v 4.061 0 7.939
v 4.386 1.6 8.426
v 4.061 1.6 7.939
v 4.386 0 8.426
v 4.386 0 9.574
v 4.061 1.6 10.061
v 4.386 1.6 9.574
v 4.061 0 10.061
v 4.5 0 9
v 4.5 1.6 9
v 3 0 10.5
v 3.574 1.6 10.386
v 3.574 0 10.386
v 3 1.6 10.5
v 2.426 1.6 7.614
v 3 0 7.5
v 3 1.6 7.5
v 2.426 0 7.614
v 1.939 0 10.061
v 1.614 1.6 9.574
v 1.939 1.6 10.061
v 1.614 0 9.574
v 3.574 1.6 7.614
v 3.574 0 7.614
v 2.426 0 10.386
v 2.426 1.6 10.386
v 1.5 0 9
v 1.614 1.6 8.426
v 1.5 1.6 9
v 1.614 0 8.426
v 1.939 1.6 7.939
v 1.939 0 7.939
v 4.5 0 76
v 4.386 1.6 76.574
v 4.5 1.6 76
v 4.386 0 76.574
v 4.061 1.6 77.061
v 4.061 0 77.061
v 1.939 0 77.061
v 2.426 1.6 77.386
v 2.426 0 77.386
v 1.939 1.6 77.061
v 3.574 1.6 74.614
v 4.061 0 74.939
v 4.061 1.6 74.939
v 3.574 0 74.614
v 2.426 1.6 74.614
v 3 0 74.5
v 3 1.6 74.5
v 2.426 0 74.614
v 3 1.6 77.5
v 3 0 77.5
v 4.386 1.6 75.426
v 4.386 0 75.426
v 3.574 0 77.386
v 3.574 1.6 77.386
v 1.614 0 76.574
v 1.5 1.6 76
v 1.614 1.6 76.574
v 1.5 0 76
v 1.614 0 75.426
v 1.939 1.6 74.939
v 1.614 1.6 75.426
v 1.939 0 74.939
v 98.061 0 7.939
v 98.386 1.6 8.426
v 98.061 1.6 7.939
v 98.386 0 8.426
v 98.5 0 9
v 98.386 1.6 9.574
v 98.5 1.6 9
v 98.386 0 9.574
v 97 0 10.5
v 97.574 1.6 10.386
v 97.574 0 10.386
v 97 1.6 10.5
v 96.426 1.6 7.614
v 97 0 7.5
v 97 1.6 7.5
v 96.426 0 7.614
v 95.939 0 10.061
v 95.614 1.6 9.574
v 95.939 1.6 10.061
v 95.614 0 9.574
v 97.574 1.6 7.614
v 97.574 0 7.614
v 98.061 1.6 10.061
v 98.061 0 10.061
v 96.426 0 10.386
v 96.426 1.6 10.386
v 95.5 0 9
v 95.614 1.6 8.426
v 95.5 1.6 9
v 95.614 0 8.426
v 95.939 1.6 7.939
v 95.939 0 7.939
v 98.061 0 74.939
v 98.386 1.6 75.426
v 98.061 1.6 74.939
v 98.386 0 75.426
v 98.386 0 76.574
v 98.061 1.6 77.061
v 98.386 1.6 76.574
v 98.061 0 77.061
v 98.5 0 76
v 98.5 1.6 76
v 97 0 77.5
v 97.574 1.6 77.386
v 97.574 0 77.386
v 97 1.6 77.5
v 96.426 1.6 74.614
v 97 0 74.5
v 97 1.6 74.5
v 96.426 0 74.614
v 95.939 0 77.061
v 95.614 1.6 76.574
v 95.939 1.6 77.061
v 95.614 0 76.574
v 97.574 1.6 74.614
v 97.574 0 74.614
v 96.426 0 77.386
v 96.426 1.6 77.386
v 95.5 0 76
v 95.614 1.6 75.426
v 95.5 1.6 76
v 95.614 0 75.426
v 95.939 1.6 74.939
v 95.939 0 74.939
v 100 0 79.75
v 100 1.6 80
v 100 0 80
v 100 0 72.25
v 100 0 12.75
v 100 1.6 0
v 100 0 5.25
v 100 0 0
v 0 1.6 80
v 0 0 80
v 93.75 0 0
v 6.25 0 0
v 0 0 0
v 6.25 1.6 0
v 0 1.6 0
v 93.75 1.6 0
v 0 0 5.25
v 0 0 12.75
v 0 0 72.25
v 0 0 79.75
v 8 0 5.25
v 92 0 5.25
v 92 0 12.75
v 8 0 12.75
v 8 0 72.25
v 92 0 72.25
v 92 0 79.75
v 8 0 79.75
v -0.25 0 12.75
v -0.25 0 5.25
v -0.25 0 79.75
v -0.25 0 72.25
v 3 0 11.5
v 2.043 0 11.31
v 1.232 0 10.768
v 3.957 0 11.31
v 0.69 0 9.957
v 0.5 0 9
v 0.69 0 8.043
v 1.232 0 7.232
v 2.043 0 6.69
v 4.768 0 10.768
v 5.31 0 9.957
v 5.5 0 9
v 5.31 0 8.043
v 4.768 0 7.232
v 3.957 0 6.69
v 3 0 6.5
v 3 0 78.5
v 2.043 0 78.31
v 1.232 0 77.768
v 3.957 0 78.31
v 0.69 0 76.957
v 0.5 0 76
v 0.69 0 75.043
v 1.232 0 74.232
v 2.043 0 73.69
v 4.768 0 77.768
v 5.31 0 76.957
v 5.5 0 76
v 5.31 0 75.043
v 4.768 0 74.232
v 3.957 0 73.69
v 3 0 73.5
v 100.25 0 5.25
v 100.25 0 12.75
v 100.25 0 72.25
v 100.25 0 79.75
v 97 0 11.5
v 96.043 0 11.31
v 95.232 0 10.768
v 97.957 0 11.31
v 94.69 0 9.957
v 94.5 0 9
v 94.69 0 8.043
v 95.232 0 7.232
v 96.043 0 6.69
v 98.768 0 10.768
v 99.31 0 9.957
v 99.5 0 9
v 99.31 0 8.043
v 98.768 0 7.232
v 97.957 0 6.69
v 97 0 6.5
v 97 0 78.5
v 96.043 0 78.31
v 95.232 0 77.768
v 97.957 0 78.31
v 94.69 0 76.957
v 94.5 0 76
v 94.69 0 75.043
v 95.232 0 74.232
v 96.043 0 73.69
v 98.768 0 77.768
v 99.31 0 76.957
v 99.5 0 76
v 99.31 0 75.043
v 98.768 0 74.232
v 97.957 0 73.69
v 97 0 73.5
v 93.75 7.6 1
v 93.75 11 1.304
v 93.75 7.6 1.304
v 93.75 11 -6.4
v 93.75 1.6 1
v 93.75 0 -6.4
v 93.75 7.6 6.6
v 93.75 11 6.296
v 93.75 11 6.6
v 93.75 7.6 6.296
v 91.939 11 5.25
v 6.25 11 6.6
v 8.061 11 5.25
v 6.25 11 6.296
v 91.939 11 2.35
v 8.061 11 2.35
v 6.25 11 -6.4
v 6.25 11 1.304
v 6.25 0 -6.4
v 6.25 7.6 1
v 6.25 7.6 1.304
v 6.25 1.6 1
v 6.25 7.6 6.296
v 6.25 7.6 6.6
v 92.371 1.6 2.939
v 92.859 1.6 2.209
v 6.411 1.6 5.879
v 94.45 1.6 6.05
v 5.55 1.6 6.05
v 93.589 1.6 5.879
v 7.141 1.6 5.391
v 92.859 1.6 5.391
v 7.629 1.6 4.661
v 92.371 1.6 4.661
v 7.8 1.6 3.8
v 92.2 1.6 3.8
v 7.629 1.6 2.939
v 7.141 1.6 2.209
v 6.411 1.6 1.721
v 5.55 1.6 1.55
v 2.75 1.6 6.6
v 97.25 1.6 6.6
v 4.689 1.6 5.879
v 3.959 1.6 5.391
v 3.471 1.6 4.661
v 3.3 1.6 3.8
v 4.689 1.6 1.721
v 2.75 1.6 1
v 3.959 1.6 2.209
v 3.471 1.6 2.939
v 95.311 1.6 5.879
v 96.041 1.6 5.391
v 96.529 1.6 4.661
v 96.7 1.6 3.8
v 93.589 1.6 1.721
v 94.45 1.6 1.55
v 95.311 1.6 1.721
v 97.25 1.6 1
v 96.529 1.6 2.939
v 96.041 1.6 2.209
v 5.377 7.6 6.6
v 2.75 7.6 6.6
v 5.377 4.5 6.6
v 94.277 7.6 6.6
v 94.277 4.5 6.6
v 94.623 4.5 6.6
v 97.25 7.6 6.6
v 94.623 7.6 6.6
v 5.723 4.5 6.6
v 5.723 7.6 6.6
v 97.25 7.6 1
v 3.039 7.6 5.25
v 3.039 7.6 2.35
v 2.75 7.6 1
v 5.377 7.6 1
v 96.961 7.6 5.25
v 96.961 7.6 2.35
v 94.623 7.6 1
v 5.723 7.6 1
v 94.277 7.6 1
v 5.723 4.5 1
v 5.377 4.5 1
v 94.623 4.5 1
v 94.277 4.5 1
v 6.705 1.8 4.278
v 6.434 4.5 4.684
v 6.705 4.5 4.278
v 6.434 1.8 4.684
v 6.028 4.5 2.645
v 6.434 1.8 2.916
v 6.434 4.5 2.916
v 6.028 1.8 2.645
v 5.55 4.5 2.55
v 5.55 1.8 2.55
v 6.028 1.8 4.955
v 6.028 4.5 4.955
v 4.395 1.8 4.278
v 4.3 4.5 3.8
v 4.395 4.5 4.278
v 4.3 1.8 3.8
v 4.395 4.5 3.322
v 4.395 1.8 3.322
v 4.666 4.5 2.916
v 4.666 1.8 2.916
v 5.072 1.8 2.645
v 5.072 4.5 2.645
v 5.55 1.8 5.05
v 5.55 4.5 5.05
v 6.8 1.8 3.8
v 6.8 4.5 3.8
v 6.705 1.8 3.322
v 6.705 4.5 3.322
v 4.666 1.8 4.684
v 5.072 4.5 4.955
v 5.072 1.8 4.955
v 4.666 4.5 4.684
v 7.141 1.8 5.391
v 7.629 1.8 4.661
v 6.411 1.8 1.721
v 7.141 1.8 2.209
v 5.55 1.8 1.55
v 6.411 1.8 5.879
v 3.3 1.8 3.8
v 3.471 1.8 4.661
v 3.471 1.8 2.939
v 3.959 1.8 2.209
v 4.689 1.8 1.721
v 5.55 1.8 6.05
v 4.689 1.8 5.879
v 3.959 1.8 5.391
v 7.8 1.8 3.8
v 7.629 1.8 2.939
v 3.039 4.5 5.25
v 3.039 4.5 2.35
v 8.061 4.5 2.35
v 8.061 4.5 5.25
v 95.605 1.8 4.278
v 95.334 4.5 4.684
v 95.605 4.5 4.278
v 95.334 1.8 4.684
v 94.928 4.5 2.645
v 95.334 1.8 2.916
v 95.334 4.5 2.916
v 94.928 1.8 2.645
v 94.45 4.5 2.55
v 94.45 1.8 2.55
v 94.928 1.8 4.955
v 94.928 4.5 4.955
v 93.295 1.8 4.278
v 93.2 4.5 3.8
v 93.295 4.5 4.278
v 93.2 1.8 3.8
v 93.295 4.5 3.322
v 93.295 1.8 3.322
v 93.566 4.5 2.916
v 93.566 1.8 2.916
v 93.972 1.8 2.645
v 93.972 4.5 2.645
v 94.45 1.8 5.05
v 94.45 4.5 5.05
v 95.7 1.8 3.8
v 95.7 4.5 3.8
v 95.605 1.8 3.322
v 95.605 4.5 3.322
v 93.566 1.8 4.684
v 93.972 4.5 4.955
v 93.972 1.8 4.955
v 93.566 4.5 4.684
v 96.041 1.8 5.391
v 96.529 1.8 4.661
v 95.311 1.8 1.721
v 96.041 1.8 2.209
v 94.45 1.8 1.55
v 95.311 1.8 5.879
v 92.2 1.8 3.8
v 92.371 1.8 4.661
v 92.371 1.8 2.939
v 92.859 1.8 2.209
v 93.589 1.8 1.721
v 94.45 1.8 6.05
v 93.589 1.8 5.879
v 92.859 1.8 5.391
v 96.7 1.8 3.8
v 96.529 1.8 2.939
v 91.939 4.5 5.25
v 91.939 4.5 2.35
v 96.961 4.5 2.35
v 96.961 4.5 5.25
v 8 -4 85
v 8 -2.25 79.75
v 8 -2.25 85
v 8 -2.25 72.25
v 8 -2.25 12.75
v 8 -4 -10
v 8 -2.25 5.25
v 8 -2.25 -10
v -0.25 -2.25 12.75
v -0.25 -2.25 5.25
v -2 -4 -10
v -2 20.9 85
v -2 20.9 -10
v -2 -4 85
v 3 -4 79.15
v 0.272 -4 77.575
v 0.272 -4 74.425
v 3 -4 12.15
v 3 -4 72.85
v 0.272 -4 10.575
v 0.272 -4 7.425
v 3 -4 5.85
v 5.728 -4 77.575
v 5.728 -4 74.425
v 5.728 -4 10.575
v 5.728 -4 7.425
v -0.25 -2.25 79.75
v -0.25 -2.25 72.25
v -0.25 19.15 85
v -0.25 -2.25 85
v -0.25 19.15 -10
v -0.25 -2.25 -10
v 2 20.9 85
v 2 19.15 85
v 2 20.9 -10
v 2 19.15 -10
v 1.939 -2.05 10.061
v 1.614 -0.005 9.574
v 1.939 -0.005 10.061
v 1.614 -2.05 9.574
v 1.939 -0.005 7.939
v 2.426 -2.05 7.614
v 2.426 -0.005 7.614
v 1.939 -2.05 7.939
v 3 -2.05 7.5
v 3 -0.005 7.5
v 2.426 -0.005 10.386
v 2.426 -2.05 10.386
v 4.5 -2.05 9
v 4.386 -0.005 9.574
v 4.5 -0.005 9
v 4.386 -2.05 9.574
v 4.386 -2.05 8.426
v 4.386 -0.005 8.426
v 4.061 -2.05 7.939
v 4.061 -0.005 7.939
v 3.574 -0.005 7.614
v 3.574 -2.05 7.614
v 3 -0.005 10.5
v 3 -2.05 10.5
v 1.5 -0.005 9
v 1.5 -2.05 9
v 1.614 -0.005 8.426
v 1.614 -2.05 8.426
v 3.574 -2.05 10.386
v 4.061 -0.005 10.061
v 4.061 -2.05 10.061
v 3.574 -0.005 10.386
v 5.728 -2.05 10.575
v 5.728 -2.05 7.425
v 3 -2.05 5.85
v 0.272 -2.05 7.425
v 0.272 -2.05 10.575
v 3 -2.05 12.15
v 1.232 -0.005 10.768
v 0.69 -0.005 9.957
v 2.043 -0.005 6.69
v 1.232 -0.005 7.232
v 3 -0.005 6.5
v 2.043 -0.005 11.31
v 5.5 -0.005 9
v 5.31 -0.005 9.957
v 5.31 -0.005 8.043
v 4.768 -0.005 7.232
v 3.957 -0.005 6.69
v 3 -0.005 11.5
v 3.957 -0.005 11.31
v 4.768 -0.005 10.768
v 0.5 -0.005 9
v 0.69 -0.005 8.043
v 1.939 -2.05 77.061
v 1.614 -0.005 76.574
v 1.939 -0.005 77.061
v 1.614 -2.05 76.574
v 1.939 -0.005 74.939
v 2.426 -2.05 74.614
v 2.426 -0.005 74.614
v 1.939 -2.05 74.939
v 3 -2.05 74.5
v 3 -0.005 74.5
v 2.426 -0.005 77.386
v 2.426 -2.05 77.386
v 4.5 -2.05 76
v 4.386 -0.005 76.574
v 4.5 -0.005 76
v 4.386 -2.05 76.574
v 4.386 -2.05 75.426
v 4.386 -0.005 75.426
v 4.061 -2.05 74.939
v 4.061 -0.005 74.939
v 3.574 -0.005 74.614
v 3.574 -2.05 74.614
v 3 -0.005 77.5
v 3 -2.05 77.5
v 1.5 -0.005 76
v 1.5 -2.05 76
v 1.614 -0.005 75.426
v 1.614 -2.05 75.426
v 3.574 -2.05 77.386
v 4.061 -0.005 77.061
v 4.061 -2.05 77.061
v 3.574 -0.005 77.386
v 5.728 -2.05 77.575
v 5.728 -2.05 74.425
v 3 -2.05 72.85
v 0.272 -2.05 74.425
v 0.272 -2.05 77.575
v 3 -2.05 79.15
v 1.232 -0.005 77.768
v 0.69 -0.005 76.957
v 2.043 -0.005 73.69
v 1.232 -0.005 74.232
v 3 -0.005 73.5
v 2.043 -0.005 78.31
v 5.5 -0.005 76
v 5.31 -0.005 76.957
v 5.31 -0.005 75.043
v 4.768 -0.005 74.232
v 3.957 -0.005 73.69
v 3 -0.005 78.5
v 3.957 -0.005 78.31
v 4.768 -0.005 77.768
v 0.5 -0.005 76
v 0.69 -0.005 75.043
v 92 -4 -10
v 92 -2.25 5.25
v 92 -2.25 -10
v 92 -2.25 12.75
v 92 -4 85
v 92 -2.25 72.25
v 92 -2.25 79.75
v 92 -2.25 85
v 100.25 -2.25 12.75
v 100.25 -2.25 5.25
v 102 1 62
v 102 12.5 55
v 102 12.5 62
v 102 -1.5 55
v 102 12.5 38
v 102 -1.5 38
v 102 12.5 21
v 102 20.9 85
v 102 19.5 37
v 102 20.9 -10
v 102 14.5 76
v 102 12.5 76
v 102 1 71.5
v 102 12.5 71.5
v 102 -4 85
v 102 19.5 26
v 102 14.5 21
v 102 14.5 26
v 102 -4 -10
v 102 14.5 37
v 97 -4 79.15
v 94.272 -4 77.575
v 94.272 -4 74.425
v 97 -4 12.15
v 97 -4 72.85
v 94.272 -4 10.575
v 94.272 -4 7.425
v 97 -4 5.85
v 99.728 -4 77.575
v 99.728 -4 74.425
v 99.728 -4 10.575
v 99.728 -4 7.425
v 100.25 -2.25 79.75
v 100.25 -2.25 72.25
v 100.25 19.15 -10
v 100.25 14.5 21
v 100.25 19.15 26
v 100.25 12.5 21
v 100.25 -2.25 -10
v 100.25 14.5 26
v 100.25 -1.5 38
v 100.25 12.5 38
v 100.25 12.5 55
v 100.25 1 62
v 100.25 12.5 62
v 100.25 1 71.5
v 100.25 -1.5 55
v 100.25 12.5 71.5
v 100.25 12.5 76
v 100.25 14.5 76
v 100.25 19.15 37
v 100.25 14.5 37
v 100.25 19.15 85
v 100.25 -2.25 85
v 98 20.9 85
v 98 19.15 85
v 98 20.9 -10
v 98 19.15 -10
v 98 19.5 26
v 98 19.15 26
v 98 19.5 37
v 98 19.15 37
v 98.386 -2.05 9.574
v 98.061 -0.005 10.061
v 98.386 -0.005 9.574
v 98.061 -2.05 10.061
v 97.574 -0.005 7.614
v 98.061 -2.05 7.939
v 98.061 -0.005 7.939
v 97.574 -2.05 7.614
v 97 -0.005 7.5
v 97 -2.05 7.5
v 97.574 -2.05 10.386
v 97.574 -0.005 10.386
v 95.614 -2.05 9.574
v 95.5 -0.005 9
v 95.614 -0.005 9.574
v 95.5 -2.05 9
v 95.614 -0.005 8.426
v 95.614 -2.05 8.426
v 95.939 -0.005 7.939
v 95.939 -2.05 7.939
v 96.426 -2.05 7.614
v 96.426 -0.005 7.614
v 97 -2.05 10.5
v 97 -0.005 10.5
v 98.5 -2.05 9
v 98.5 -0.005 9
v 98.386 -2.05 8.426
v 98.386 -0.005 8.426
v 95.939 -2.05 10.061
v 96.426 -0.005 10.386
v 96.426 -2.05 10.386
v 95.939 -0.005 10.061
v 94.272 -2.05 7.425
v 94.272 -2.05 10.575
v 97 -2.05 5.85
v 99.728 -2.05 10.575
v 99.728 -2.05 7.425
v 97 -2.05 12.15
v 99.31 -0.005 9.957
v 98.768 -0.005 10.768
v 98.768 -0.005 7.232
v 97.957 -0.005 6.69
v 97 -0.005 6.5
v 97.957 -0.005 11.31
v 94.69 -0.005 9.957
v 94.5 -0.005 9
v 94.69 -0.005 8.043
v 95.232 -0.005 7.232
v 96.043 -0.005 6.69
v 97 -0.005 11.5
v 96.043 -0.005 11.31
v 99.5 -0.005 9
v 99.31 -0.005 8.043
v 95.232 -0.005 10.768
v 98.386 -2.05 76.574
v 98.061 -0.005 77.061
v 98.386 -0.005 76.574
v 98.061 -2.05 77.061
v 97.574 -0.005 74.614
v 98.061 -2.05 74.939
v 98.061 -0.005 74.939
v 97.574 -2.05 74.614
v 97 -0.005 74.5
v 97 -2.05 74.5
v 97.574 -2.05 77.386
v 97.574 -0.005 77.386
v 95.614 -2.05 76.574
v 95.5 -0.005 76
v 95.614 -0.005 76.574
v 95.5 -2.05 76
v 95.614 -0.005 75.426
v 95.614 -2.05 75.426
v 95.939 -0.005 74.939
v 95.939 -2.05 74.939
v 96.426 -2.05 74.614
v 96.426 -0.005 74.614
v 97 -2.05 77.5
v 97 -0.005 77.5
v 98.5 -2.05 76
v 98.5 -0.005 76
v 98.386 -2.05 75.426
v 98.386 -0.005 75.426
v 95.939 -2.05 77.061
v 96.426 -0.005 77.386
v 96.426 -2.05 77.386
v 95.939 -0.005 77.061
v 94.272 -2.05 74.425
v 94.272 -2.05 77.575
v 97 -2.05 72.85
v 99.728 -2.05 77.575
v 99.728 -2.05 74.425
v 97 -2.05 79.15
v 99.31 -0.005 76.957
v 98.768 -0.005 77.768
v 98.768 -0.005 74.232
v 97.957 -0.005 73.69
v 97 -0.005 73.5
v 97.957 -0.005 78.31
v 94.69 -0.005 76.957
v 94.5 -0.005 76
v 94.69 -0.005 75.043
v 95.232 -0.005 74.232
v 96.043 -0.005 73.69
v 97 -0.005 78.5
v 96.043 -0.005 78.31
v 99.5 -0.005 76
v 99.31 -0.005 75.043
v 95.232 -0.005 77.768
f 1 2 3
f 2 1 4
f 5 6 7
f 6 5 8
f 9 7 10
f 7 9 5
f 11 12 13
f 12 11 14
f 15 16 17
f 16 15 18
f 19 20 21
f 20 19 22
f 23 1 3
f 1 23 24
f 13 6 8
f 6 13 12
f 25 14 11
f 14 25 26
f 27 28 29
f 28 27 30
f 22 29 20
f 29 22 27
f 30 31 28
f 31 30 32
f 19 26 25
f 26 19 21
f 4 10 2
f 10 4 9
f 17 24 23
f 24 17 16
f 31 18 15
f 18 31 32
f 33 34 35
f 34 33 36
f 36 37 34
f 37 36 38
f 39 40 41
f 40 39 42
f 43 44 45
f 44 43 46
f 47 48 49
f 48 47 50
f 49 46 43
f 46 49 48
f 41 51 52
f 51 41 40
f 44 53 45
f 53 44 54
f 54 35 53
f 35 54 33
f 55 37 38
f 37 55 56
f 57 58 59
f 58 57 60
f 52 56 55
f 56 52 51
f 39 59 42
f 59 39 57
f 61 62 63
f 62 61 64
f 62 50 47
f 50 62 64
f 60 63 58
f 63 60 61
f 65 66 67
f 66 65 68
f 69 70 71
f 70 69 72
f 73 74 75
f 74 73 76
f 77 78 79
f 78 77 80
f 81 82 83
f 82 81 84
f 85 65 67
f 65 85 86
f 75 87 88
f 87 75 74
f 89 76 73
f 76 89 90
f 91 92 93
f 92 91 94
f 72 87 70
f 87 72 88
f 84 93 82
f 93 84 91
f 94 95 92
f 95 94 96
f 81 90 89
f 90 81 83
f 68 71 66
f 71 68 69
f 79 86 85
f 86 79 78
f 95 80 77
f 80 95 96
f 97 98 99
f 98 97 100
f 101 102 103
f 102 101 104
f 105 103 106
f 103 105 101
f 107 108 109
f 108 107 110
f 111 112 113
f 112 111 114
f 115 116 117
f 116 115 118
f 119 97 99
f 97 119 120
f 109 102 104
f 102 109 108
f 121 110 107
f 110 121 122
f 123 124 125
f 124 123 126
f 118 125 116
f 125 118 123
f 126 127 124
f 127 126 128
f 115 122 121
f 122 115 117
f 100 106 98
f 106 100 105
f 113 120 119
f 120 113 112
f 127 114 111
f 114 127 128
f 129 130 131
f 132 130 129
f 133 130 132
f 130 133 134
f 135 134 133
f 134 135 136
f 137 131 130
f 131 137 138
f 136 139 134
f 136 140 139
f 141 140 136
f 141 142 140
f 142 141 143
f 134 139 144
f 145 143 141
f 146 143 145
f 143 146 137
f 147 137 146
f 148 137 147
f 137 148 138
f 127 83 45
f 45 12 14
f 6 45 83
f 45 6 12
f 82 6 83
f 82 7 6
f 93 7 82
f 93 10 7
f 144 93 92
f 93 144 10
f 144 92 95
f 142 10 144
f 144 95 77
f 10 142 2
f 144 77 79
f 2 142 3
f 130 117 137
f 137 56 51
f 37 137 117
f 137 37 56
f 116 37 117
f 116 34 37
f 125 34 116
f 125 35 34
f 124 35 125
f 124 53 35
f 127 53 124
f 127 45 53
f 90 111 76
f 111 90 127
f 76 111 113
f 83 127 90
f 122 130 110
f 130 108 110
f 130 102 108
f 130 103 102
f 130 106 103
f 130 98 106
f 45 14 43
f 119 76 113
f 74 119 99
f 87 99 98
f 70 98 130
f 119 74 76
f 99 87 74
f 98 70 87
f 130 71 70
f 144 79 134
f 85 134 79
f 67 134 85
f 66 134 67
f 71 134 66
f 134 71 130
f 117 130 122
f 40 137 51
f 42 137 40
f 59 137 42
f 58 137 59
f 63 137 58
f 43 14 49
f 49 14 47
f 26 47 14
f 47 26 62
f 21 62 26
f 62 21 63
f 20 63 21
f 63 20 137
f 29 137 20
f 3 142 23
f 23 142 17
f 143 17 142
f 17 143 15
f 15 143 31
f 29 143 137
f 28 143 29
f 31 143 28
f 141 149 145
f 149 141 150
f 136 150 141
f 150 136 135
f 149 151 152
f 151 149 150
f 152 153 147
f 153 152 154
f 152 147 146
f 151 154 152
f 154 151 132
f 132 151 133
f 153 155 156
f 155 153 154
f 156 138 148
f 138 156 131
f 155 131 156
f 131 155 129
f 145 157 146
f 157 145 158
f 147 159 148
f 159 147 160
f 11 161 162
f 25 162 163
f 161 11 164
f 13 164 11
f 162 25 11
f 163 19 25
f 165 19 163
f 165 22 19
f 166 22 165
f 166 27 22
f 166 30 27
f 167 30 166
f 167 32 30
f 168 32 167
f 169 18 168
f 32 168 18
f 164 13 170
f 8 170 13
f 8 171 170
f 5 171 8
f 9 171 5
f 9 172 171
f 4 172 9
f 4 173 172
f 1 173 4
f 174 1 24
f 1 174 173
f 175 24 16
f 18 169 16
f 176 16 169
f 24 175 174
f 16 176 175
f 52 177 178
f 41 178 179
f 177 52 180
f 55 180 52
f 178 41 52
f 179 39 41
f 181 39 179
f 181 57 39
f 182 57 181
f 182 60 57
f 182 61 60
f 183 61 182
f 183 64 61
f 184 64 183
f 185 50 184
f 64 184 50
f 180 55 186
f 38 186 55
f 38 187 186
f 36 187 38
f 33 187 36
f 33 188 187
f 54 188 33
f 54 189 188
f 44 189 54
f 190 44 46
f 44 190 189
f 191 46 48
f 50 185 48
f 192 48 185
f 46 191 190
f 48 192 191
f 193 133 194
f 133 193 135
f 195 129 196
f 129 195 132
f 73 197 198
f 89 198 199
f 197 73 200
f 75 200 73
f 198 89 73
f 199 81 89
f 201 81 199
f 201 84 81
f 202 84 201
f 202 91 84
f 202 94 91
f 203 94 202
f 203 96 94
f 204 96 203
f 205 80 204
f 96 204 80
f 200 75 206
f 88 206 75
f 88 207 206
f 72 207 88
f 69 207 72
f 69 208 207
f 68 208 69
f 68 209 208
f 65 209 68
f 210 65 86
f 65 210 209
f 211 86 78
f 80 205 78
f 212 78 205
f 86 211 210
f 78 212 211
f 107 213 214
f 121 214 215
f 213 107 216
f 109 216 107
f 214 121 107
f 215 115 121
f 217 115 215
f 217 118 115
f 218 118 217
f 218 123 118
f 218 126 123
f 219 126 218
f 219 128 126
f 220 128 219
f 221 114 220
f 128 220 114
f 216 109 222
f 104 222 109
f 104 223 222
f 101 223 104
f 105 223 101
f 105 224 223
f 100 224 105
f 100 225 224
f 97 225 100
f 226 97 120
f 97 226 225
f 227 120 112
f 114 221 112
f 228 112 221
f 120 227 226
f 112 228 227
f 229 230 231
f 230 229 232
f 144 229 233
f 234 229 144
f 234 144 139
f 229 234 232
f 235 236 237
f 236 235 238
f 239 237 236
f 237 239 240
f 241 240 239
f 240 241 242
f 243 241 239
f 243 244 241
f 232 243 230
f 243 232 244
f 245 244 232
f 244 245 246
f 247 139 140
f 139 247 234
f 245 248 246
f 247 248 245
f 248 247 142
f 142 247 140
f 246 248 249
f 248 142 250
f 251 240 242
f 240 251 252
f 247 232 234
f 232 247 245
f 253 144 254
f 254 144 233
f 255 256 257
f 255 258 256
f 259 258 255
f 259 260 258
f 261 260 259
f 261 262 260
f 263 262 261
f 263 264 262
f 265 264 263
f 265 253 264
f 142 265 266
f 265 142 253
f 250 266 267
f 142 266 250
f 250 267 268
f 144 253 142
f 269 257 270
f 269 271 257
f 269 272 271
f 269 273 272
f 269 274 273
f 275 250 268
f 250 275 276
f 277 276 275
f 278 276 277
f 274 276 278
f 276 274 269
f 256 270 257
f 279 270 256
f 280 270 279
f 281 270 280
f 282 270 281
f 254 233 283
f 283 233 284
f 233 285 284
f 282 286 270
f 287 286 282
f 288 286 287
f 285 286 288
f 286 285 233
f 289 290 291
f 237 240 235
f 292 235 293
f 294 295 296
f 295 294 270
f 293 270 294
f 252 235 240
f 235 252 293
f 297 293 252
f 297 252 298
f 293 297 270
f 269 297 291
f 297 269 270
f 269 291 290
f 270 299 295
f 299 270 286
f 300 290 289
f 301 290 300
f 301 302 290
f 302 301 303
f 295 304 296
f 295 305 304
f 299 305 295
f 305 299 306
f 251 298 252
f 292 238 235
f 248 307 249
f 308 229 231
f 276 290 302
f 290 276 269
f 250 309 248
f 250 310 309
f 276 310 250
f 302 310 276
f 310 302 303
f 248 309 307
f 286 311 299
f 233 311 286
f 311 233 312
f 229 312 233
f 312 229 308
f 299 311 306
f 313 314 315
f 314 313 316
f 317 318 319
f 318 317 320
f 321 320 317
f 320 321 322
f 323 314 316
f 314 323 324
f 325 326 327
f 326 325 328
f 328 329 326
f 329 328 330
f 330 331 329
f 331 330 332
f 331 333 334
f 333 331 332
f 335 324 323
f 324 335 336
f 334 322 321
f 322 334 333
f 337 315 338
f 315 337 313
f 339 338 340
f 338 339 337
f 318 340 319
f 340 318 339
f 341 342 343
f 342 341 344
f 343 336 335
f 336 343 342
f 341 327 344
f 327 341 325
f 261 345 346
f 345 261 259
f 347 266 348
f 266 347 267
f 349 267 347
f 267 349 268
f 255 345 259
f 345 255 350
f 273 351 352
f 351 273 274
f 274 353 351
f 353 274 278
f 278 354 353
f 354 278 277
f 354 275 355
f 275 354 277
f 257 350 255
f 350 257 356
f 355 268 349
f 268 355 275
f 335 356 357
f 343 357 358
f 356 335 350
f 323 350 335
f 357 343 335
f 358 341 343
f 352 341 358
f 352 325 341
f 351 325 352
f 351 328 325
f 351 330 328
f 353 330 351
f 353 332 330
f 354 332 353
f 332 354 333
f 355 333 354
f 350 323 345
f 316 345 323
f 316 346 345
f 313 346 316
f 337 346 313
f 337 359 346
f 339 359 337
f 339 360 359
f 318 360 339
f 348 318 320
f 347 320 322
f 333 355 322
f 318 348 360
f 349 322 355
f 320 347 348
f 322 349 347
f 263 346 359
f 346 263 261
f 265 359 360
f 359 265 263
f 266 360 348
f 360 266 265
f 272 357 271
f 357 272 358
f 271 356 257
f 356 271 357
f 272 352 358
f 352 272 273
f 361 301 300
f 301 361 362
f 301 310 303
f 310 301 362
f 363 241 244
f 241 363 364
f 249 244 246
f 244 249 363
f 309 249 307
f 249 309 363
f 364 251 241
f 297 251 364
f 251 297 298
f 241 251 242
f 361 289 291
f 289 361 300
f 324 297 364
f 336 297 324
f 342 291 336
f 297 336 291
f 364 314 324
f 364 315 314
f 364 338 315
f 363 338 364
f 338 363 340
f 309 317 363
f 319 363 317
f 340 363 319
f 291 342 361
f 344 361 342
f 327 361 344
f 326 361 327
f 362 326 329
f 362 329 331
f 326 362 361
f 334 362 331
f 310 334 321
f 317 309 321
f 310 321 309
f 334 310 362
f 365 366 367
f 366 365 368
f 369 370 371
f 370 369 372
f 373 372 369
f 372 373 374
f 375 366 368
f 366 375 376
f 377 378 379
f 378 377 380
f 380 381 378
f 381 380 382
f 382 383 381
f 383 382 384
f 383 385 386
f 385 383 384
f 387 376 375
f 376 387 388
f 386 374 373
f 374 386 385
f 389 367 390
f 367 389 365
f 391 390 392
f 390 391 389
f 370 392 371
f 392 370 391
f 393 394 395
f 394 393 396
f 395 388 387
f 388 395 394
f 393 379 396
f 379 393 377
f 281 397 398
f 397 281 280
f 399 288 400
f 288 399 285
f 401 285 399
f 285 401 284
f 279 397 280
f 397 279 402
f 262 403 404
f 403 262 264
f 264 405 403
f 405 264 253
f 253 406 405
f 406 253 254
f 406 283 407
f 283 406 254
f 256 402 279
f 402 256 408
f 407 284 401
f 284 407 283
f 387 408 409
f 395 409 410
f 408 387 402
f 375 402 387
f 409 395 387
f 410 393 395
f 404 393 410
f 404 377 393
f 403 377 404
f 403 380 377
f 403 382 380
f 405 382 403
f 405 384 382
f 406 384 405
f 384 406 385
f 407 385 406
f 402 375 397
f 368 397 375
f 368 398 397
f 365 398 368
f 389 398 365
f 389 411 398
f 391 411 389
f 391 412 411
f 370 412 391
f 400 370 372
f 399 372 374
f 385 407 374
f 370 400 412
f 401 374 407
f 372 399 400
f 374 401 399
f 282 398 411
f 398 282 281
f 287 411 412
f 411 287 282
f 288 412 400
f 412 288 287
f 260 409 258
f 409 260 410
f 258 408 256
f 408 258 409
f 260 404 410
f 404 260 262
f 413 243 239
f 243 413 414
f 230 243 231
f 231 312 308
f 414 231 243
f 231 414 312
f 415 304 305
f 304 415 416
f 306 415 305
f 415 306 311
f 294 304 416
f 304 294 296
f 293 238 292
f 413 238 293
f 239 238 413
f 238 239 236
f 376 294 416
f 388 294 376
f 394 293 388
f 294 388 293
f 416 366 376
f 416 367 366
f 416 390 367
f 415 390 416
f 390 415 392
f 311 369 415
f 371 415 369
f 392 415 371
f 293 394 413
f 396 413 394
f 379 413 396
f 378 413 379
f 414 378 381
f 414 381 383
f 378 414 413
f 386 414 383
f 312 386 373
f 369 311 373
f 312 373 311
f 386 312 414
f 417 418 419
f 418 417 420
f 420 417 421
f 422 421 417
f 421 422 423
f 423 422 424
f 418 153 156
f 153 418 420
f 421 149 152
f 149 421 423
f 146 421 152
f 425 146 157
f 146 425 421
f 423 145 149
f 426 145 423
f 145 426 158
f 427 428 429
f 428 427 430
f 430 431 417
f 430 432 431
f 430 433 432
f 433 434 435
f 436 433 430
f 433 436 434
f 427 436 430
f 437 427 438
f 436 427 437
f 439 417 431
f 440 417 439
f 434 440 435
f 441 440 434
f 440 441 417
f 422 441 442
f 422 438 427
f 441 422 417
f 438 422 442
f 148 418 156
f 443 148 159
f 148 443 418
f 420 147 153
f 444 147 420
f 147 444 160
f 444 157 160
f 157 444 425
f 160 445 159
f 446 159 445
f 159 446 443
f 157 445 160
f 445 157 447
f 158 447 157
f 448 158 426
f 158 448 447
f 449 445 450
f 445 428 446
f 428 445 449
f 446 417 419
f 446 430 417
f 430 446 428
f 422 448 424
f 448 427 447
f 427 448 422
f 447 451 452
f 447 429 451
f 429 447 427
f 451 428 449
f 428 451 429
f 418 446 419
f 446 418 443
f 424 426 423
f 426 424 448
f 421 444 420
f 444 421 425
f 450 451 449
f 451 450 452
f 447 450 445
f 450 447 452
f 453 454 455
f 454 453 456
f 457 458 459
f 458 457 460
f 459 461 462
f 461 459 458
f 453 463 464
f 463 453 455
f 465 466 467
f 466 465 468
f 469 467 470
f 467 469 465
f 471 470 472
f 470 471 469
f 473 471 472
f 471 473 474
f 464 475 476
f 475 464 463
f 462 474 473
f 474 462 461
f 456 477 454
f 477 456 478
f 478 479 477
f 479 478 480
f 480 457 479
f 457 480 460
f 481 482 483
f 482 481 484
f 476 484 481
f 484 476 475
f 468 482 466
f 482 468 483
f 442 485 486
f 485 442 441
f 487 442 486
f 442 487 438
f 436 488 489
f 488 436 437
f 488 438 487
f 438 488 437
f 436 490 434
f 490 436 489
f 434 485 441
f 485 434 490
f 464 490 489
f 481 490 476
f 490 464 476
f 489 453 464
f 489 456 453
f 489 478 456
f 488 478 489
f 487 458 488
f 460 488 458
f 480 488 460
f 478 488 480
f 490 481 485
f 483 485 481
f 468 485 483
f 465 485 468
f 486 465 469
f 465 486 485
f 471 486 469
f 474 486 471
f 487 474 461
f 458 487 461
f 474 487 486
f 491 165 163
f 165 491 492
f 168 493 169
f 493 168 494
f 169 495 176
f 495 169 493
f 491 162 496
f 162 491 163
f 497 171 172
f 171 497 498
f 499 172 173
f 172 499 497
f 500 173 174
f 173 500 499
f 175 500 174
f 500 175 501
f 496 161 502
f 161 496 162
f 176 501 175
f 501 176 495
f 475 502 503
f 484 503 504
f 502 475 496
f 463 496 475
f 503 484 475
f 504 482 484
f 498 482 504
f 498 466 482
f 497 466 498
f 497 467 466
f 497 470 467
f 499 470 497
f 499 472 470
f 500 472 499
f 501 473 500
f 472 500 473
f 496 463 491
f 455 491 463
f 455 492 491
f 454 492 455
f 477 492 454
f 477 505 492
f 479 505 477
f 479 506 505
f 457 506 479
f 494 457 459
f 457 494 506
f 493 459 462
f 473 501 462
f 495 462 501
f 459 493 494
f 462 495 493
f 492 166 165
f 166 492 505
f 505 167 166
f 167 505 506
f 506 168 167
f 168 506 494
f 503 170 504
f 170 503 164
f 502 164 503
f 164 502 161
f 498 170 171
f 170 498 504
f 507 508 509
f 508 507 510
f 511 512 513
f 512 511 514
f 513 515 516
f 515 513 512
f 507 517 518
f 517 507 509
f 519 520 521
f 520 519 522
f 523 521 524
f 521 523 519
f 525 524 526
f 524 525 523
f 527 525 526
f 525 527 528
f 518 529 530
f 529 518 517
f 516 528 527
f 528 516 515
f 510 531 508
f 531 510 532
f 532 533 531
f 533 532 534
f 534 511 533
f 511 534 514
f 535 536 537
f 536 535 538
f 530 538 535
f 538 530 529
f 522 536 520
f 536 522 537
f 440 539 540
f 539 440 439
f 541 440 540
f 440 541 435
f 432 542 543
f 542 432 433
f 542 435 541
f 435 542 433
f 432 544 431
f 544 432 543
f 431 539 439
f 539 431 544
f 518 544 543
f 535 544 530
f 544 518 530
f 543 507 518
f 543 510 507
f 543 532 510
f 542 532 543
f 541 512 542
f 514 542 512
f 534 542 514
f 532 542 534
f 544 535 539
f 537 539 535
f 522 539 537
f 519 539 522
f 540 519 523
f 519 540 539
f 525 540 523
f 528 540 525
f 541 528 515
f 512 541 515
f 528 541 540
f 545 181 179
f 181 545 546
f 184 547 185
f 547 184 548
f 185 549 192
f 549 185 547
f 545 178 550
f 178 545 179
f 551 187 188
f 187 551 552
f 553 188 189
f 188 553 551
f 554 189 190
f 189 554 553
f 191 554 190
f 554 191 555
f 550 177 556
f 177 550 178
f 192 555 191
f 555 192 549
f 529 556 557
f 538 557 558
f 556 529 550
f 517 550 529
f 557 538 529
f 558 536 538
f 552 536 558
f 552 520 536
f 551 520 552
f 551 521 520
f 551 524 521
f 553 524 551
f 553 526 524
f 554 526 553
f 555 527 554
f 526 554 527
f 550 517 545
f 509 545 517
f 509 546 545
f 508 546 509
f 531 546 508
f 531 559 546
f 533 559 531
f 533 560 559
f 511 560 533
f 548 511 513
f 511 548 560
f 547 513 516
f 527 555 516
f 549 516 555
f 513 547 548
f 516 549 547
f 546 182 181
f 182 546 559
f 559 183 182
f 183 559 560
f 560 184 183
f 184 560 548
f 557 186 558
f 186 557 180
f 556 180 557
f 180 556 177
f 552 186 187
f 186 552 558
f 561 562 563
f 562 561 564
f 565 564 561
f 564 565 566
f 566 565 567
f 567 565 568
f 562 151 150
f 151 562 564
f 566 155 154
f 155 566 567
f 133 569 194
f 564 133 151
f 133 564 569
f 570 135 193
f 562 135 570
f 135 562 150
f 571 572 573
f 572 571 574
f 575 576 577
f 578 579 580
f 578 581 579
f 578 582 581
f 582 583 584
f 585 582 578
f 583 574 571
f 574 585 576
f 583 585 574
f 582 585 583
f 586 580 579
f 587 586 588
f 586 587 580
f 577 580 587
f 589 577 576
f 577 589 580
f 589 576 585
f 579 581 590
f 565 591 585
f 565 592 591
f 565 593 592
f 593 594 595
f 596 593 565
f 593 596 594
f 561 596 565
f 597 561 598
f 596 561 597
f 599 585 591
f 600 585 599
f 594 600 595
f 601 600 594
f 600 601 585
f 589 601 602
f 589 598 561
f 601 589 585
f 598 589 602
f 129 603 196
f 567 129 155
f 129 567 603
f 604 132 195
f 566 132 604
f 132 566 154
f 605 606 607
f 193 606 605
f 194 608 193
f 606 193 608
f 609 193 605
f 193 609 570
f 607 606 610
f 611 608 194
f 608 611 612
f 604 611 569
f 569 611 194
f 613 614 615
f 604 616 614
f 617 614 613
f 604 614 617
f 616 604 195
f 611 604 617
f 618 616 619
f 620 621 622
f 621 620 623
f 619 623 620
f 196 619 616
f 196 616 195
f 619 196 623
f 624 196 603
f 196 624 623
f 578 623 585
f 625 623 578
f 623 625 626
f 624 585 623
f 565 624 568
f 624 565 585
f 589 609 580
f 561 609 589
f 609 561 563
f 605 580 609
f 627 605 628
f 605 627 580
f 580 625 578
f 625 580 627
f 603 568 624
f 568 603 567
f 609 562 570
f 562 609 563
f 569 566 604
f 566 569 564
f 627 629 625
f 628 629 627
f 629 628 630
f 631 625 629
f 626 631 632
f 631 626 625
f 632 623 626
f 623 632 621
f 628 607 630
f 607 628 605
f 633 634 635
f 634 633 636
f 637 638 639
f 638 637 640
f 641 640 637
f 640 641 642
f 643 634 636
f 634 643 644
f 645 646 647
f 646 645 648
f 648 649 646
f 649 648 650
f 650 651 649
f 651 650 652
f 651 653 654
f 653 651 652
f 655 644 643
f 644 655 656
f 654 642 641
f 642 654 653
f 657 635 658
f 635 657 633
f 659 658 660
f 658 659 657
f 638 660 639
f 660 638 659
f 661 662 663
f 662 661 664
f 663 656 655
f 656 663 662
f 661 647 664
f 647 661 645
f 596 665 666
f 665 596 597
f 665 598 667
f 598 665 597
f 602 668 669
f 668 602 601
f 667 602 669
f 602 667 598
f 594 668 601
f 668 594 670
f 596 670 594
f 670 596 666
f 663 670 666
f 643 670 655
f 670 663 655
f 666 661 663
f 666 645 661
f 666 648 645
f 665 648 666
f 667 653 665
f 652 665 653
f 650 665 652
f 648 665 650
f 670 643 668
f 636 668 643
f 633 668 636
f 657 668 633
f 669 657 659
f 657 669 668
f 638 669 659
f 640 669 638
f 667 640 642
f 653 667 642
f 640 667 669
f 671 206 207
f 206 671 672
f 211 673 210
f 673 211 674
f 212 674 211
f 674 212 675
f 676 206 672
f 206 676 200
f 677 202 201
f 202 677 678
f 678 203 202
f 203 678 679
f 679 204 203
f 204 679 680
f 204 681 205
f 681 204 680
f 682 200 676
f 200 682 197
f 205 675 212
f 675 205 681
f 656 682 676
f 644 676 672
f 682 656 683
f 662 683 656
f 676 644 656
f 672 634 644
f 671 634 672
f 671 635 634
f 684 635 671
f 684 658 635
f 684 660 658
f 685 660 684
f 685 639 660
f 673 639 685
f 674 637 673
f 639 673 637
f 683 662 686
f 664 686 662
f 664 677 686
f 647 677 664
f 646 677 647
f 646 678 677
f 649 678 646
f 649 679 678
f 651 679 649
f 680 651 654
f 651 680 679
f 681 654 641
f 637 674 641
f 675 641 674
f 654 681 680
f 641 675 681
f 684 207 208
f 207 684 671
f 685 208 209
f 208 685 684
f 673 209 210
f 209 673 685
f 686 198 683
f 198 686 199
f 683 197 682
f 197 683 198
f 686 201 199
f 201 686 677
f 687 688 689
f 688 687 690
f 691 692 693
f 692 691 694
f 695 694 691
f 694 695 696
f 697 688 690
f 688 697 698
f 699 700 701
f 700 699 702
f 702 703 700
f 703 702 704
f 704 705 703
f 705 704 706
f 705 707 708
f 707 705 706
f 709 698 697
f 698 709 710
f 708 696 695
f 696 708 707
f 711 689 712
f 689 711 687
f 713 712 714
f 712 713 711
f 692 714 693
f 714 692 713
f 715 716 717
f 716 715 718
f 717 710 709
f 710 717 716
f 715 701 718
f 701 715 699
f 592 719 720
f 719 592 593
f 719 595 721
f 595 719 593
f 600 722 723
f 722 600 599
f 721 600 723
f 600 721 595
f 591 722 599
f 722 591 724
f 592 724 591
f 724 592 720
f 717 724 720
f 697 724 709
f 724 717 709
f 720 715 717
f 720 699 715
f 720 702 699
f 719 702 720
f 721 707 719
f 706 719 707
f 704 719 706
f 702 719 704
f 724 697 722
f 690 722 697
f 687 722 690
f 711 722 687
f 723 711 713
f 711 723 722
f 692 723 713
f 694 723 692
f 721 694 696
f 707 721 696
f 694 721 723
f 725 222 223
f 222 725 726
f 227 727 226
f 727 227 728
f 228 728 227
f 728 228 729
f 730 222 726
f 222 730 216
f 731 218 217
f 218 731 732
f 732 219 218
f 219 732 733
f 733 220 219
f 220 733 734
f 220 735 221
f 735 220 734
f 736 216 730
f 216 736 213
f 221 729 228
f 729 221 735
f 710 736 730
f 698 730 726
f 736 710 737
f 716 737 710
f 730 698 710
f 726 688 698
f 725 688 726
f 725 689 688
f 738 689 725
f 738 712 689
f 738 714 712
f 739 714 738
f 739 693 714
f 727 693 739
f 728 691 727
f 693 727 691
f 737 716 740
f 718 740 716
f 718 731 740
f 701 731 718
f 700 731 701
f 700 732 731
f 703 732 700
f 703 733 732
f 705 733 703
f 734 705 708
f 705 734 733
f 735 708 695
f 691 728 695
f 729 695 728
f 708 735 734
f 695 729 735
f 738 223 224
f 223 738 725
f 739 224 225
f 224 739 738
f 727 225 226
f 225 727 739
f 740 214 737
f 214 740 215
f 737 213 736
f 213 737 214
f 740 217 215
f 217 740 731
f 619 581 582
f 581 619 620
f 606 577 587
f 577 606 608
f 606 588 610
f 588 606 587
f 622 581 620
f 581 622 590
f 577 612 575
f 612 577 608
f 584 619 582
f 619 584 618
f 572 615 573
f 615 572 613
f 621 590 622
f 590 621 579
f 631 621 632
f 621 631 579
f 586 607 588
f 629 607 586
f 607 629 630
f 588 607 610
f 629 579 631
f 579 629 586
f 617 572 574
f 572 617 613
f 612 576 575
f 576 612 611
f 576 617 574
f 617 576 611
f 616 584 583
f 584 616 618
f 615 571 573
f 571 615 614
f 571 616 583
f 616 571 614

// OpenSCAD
// file: ../library/din41612/din41612_male.scad
// din41612 male connector
// =======================

include <din41612_male_dim.scad>

use <../linurs/linurs_screw.scad>

module din41612_male(){ 
  // color("LightGrey")
  difference(){
    union(){
        translate([0,din41612_male_w1/2,din41612_male_h/2-din41612_male_h1])  
        cube([din41612_male_l1,
              din41612_male_w1,
              din41612_male_h],
             center=true);  
      translate([0,(din41612_male_w1-din41612_male_w)/2,(din41612_male_h-din41612_male_h1)/2]) 
        cube([din41612_male_l1,
              (din41612_male_w-din41612_male_w1),
              din41612_male_h-din41612_male_h1],
             center=true);  
      translate([0,din41612_male_w2/2+din41612_male_w1-din41612_male_w,din41612_male_h2/2])
        cube([din41612_male_l,
              din41612_male_w2,
              din41612_male_h2],
             center=true);  
    }
    for(i=[-1,1]){ // mounting holes
      translate([i*din41612_male_dl/2,
                 din41612_male_w1-din41612_male_w+din41612_male_w2/2, 
                 din41612_male_h1])
      rotate([180,0,90])screw_fix(
            w=din41612_male_h2, 
            d=M2_5, 
            type=head_cyl, 
            nut_sink=din41612_male_h,
            t=0);
    }
  }
}
din41612_male();  
// file: ../library/din41612/din41612_male_dim.scad
include <../linurs/linurs_screw_dim.scad>

// connector dimensions
din41612_male_l=94.5;    // lenght of the connector
din41612_male_l1=87.5;   // 
din41612_male_w=13;      // width of the connector
din41612_male_w1=6.4;    // 
din41612_male_w2=5.6;    // 
din41612_male_h=11;      // height of the connector
din41612_male_h1=1.6;    // 
din41612_male_h2=6;      // 

din41612_male_dl=88.9;   // distance between mounting holes
// file: ../library/din41612/din41612_female_dim.scad
include <../linurs/linurs_screw_dim.scad>

// connector dimensions
din41612_female_l=95;       // lenght of the connector
din41612_female_l1=85;      // lenght of the connector head
din41612_female_h=11.6;     // height of the connector
din41612_female_h1=5.2;     // height produced by the connector when pulgged in 
din41612_female_w=11;       // width of the connector
din41612_female_w1=8.5;     // width of the connector head

din41612_female_dl=90;      // distance between mounting holes
// file: ../pcb/pcb.scad
// pcb
// ===
// The pcb is the master object and has its 
// lower left corner solder side at the origin of the 
// coordinate system 

n=2;  // [1,2,3,4,5,6,7,8]
show_pcb="assemblies"; // [assemblies,assembly,pcb]

include <pcb_dim.scad>
include <../motherboard/motherboard_dim.scad>

use <../library/din41612/din41612_male.scad>

module pcb(){
  echo("pcb");  
  color("greenyellow")
  difference(){
    cube([pcb_l,pcb_h,pcb_w]); // pcb
    for(x=[-1,1]){ // mounting holes
      for(y=[pcb_wd1,pcb_wd1+pcb_wd]){
        translate([x*pcb_ld/2+pcb_l/2,0,y])
        rotate([90,0,0])
        cylinder(d=pcb_d,h=3*pcb_h,center=true,$fn=16);
      }
    }
  }
}

module pcb_assembly(){
  echo("pcb assembly");  
  pcb();  
  translate([pcb_l/2,pcb_h,0])  
  rotate([-90,0,0])din41612_male();  
}

module pcb_assemblies(n=1){
  echo("pcb assemblies"); 
  for(i=[0:n-1]){ // add the connectors
      echo(i);
      translate([0,step*i,0])
      pcb_assembly();
  }    
}    

if(show_pcb=="assemblies"){
  pcb_assemblies(n=n);
}

if(show_pcb=="assembly"){
  pcb_assembly();
}

if(show_pcb=="pcb"){
    // Move to center to create 2D drawings from top view 
    // with script OpenSCAD22d.py
    //
    rotate([90,0,180])
    //
    translate([-pcb_l/2,-pcb_h/2,-pcb_w/2])
    pcb();
}
// file: ../bracket/bracket.scad
// bracket
// =======
// A bracket of the elecbox module
// - type: 0 front bracket, 1 rear bracket
// - width 1..n in steps

// parameters for customizer
// bracket width
n=2; // [1,2,3,4,5,6,7,8]
// type
bracket="Front"; // [Front,Back]
// intermediate mounting holes
intermediate=false;  

include <../pcb/pcb_dim.scad>

include <../motherboard/motherboard_dim.scad>
include <../library/linurs/linurs_screw_dim.scad>
include <bracket_dim.scad>

use <../library/linurs/linurs_screw.scad>
    
module back_bracket(n=1, intermediate=false){
  mirror([1,0,0])       // mirror it if desired
  front_bracket(n=n, intermediate=intermediate); 
}
    
module front_bracket(n=1, intermediate=false){
  echo("bracket");  
  //color("White")
  intermediatestep=(intermediate)?step:0; 
  difference(){
    union(){
      translate([-bracket_h2/2-bracket_gap/2,
                 bracket_w(n)/2-bracket_w1,
                 bracket_l/2])  
      cube([bracket_h2,
            bracket_w(n),
            bracket_l],center=true); // create the bracket front
  
      translate([bracket_h/2-bracket_h2-bracket_gap/2,
                 bracket_t/2-bracket_w1,
                 bracket_l/2]) 
      cube([bracket_h,
            bracket_t,
            bracket_l],center=true); // U shape side of the screw
      
      translate([bracket_h1/2-bracket_h2-bracket_gap/2,
                 bracket_w(n)-bracket_w1-bracket_t/2,
                 bracket_l/2]) 
      cube([bracket_h1,
            bracket_t,
            bracket_l],center=true); // U shape where no screw  
      for(x=[1:n]){  // create the mounting hole cubes 
        for(z=[bracket_l1,
               bracket_l1+bracket_ld]){
          translate([ bracket_h/2-bracket_h2-bracket_gap/2,
                     -bracket_w1/2+(x-1)*intermediatestep,
                     z])
          cube([bracket_h,
                bracket_w1,
                bracket_l2],center=true);
        }
      }   
    }
    for(x=[1:n]){ // create the mounting hole 
      for(z=[bracket_l1,
             bracket_l1+bracket_ld]){
        translate([bracket_h3-bracket_h2-bracket_gap/2,
                  -bracket_w1/2+(x-1)*intermediatestep,
                   z])
        rotate([0,90,0])
        rotate([-90,0,0])
        screw_fix(w=bracket_w1,d=bracket_screw,type=head_no, t=bracket_screw_gap);
      }
    }
  }
}

if(bracket=="Front"){
  front_bracket(intermediate=intermediate,n=n);
}

if(bracket=="Back"){
  back_bracket(intermediate=intermediate,n=n);
}
// file: ../library/linurs/linurs_screw.scad
// Metric screws and nuts 
// urs@linurs.org 2019
// It is targeted for 3D printing applications. 
// To look realistic is not the goal (Example: Nuts do not have a hole)

include <linurs_screw_dim.scad>

d=0; //[0:M2_5,1:M3,2:M4,3:M5]
type=0;//[0:head_cyl,1:head_cnt,2:head_no,3:head_hex]
w=15; 
i=10;
nut_sink=0;
screw_sink=0; 
t=0.01;
fn=16;

/* [hex_bolt] */
show_hex_bolt=false;

/* [nut] */
show_nut=false;

/* [screw] */
show_screw=false;

/* [screw_fix] */
show_screw_fix=false;

/* [screw_cut] */
show_screw_cut=false;

/* [nut_cut] */
show_nut_cut=false;
wi=0; 
rot=false;

// functions used multiple times to position nuts and heads
function headh_cyl(d)=screw_cyl[d][1];  // height of cyl screw head
function headh_cnt(d)=screw_cyl[d][1];  // height of cnt screw head
function headh(d,type=head_cyl)=(type==head_cyl ? headh_cyl(d) : (type==head_cnt ? headh_cnt(d) : 0 )); // height of screw head 

function nuth(d)=screw_hex[d][2];   // height of hex nut

// head of a cylinder screw
module screw_head_cyl(d=M3, t=0)
{
  screwhd=screw_cyl[d][0]+t; // diameter of cylinder screw head
  cylinder(d=screwhd,h=headh(d=d, type=head_cyl), center=true,$fn=16); // screw head
}

// head of a countersunk screw
module screw_head_cnt(d=M3, t=0)
{
  screwd=screw_d[d]+t; 
  screwhd=screw_cnt[d][0]+t; // diameter of cylinder screw head
  cylinder(d1=screwd,d2=screwhd,h=headh(d=d,type=head_cnt), center=true,$fn=16); // screw head
}

// head of a hex screw
module screw_head_hex(d=M3, t=0)
{
    translate([0,0,-nuth(d)/2])nut(d=d, t=t);
}

// head of all screws
module screw_head(d=M3, type=head_cyl, t=0)
{ 
  if(type==head_cnt){
    screw_head_cnt(d=d, t=t);
  } else {
    if(type==head_cyl){
      screw_head_cyl(d=d, t=t);
    } else {
       if(type==head_hex){
           screw_head_hex(d=d, t=t); 
       } 
    }    
  }
}

// hex bolt 
module hex_bolt(d=M3, w=10, t=0)
{
  nutd=screw_hex[d][1]+t; // outer diameter of hex bolt
  cylinder(r=nutd/2,h=w+t, center=true,$fn=6); // nut
}

// nut 
module nut(d=M3, t=0)
{
  hex_bolt(d=d, w=nuth(d), t=t);    
}

// screw 
// w outer width of the screw = screw length + head 
module screw(w=10, d=M3, type=head_cyl, t=0){
  screwd=screw_d[d]+t;       // screw diameter
  cylinder(d=screwd, h=w, center=true,$fn=16); // screw thread length
  translate([0,0,w/2-headh(d=d,type=type)/2])
  screw_head(d=d,type=type, t=t);
}

// screw fix
// w outer width of the screw = screw length + head 
// sink additional material below to remove 
// raise additional material above to remove
module screw_fix(w=10, d=M3, type=head_cyl, screw_sink=0, nut_sink=0, t=0){
  screw(w=w, d=d, type=type, t=t);
  translate([0,0,-w/2+nuth(d)/2])
    nut(d=d,t=t);
  //additional material to be removed above the nut  
  translate([0,0,-(w+nut_sink)/2])hex_bolt(d=d,w=nut_sink+0.01,t=t);    
  //additional material to be removed above the screw head
  if(type==head_cnt){  
    translate([0,0,w/2+screw_sink])
    cylinder(d=screw_cnt[d][0]+t,h=screw_sink+0.01,center=true,$fn=16);
  }else{ 
    translate([0,0,(w+screw_sink)/2])
    cylinder(d=screw_cyl[d][0]+t,h=screw_sink+0.01,center=true,$fn=16);
  }     
}

// screw cut
// material to be extracted from object to slide in a counter sunk screw for fixation
// w height of the cut out
// i depth of the screw
module screw_cut(d=M3,w=20,i=10,t=0,fn=32){
    hsh=screw_cnt[d][1];
    ws=screw_cnt[d][0]+t;
    ds=screw_d[d]+t;
    
    translate([i/2,0,-(w-hsh)/2])
      cube([i,ws,hsh],center=true);
    
    translate([0,0,-(w-hsh)/2])
      cylinder(d=ws,h=hsh,center=true,$fn=32);
    
    translate([0,0,-(w-hsh)/2+hsh])
        cylinder(d2=ds, d1=ws, h=hsh,center=true,$fn=fn);
    
    cylinder(h=w, d=ds, center=true, $fn=fn);   
    
    translate([i/2,0,0]) 
        cube([i,ds,w],center=true);
    
    for(y=[-1,1]){
        translate([i/2,y*ds/2,-w/2+hsh])
            rotate([45,0,0])
            cube([i,sqrt(2)*(ws-ds)/2,sqrt(2)*(ws-ds)/2],center=true);
    }
}
//screw_cut();

// nut cut
// material to be extracted from object to slide in a nut for fixation
// w height of the cylinder
// i lenght of the inlet
module nut_cut(w=10, wi=0, d=M3, i=10, t=0, rot=false,type=head_cyl){ 
  r=(rot)?90:0;
  ds=(rot)?screw_hex[d][1]:screw_hex[d][0];
  rotate([0,0,r])nut(d,t);
  translate([i/2,0,0])
    cube([i,ds+t,nuth(d)+t],center=true);
  translate([0,0,-wi])
      if(type==head_cnt){    
          screw(w=w, d=d, type=type, t=t); 
        translate([0,0,w/2])
          cylinder(d=screw_cnt[d][0]+t,h=raise,center=true,$fn=16);
      }
      else{ 
          screw(w=w, d=d, type=type, t=t);   
  //      translate([0,0,0])
          //#cylinder(d=screw_cyl[d][0]+t,h=w,center=true,$fn=16);
      }       
}

if(show_hex_bolt==true){
   hex_bolt(d=d, w=w, t=t);
}

if(show_nut==true){
  nut(d=d, t=t);
}    

if(show_screw==true){
   screw(w=w, d=d, type=type, t=t);
}

if(show_screw_fix==true){
  screw_fix(w=w, d=d, type=type, nut_sink=nut_sink, screw_sink=screw_sink, t=t);
}

if(show_screw_cut==true){
  screw_cut(d=d,w=w,i=i,t=t,$fn=fn);
}    

if(show_nut_cut==true){
  nut_cut(w=w, wi=wi, d=d, i=i, t=t,rot=rot,type=type);
}  
// file: ../library/linurs/linurs_screw_dim.scad
// Metric screws and nuts 
// urs@linurs.org

// contains dimensions of linurs_screw and can be included in other 
// OpenScad files 

// Parameters in this file
// d screw diameter M2_5, M3, ... (enumeration with screw_d)
// t millimeters added to diameters 

// enumerations of metric threads
M2_5=0;
M3=1;
M4=2;
M5=3;

// enumerations screw head type
head_cyl=0; // cylinder
head_cnt=1; // countrsunk
head_no=2;  // no head at all
head_hex=3;  // no head at all

// screw diameters
screw_d=[
2.5, // M2.5
3.0, // M3
4.0, // M4
5.0  // M5
];

// sizes for hex nuts
screw_hex=[
//   s,   e,   h
 [ 5.0, 5.8, 1.7], // M2.5
 [ 5.5, 6.4, 2.0], // M3
 [ 7.0, 8.1, 2.8], // M4
 [ 8.0, 9.2, 3.5]  // M5
];

// sizes for cylinder screw heads
screw_cyl=[
//   d,   h
 [ 4.5, 1.6], // M2.5
 [ 5.5, 2.0], // M3
 [ 7.0, 2.6], // M4
 [ 8.5, 3.3]  // M5
];

// sizes for countersunk screw heads
screw_cnt=[
//   d,   h
 [ 4.7, 1.50], // M2.5
 [ 5.6, 1.65], // M3
 [ 7.4, 2.20], // M4
 [ 9.2, 2.50]  // M5
];
// file: ../motherboard/motherboard_dim.scad
include <../library/linurs/linurs_screw_dim.scad>
include <../library/din41612/din41612_female_dim.scad>
include <../library/din41612/din41612_male_dim.scad>
include <../pcb/pcb_dim.scad>
// motherboard pcb dimensions
motherboard_l=pcb_l;   // pcb width
motherboard_h=1.6;     // pcb thickness
step=25.4;             // distance between modules

function motherboard_w(n)=din41612_female_w+step*(n-1);

screw_motherboard_d=M2_5;
screw_motherboard_l=16;
motherboard_pass=0.5;// gap to fit screws 

motherboard_z_offset=-din41612_male_w1-din41612_female_h1-motherboard_h;
// file: ../bracket/bracket_dim.scad
// bracket

include <../pcb/pcb_dim.scad>
include <../motherboard/motherboard_dim.scad>
include <../library/linurs/linurs_screw_dim.scad>

bracket_screw=M2_5;   // hole for the screw

bracket_gap=0.5;      // gap between bracket to make sure it fits in the box
bracket_screw_gap=0.5;// gap to fit the screw

bracket_l=pcb_w+15;   // height of bracket
bracket_l1=19;        // hole l
bracket_l2=3*screw_d[bracket_screw];
bracket_ld=pcb_wd;    // hole distance

bracket_h=10;         // depth of the U shape at the side of the screw
bracket_h1=4;         // depth of the U shape at the side where no screw is 
bracket_h2=2-bracket_gap/2;   // thickness of bracket
bracket_h3=5;         // hole h

bracket_w1=4;         // height of the mounting hole cube
bracket_tn=2;         // thickness of bracket
bracket_t=bracket_tn-bracket_gap/2;  // thickness of bracket - gap

bracket_offset_z=-10;  // bracket offset in elecbox z axis

function bracket_w(n)=step*n-bracket_gap;
function bracket_w2(n)=step*n-2*bracket_tn;
// file: ../pcb/pcb_dim.scad
// The pcb is the master object of the project
// therefore no other include files from other objects
// are necessary

// pcb constants
pcb_l =100;  // lenght of the pcb
pcb_ld = 94; // hole distance 
pcb_w=80;    // height of the pcb
pcb_wd = 67; // hole distance
pcb_wd1 = 9; // hole to edge distance 
pcb_d=3;     // diameter of holes
pcb_h=1.6;   // thickness
// main file
// BeagleBone module
// ==============

BeagleBone="assembly"; // [assembly,front,back,print_front,print_back]

include <../pcb/pcb_dim.scad>
include <../bracket/bracket_dim.scad>
include <../motherboard/motherboard_dim.scad>
include <../library/linurs/linurs_screw_dim.scad>

use <../library/linurs/linurs_screw.scad>
use <../bracket/bracket.scad>
use <../pcb/pcb.scad>

module BeagleBone_back(){
    h1=2;//
    hb=12.5;
    w1=55;
    z1=21;
    
    h2=5;
    w2=11;
    z2=26;
    
    h3=14;
    w3=17;
    z3=38;
    
    h4=11.5;
    w4=9.5;
    z4=62;
    
    difference(){
        
        translate([0,0,bracket_offset_z])back_bracket(n=1);
        
        translate([
          0,
          h1/2+hb,
          z1+w1/2])
        cube([
          bracket_h,
          h1,
          w1],center=true);
        
        translate([
          0,
          h2/2+hb+h1,
          z2+w2/2])
        cube([
          bracket_h,
          h2,
          w2],center=true);
        
        translate([
          0,
          hb-h3/2,
          z3+w3/2])
        cube([
          bracket_h,
          h3,
          w3],center=true);
          
        translate([
          0,
          hb-h4/2,
          z4+w4/2])
        cube([
          bracket_h,
          h4,
          w4],center=true);  
    }
}

module BeagleBone_front(){
    translate([0,0,bracket_offset_z])front_bracket(n=1);
}

module BeagleBone_assembly(){
    pcb_assembly();
    BeagleBone_front();
    translate([pcb_l,0,0])BeagleBone_back();
}

if(BeagleBone=="assembly"){
  BeagleBone_assembly();
}

if(BeagleBone=="front"){
  BeagleBone_front();
}

if(BeagleBone=="back"){
  BeagleBone_back();
}

if(BeagleBone=="print_front"){
  rotate([0,-90,0])
    BeagleBone_front();
}

if(BeagleBone=="print_back"){
  rotate([0,90,0])BeagleBone_back();
}
